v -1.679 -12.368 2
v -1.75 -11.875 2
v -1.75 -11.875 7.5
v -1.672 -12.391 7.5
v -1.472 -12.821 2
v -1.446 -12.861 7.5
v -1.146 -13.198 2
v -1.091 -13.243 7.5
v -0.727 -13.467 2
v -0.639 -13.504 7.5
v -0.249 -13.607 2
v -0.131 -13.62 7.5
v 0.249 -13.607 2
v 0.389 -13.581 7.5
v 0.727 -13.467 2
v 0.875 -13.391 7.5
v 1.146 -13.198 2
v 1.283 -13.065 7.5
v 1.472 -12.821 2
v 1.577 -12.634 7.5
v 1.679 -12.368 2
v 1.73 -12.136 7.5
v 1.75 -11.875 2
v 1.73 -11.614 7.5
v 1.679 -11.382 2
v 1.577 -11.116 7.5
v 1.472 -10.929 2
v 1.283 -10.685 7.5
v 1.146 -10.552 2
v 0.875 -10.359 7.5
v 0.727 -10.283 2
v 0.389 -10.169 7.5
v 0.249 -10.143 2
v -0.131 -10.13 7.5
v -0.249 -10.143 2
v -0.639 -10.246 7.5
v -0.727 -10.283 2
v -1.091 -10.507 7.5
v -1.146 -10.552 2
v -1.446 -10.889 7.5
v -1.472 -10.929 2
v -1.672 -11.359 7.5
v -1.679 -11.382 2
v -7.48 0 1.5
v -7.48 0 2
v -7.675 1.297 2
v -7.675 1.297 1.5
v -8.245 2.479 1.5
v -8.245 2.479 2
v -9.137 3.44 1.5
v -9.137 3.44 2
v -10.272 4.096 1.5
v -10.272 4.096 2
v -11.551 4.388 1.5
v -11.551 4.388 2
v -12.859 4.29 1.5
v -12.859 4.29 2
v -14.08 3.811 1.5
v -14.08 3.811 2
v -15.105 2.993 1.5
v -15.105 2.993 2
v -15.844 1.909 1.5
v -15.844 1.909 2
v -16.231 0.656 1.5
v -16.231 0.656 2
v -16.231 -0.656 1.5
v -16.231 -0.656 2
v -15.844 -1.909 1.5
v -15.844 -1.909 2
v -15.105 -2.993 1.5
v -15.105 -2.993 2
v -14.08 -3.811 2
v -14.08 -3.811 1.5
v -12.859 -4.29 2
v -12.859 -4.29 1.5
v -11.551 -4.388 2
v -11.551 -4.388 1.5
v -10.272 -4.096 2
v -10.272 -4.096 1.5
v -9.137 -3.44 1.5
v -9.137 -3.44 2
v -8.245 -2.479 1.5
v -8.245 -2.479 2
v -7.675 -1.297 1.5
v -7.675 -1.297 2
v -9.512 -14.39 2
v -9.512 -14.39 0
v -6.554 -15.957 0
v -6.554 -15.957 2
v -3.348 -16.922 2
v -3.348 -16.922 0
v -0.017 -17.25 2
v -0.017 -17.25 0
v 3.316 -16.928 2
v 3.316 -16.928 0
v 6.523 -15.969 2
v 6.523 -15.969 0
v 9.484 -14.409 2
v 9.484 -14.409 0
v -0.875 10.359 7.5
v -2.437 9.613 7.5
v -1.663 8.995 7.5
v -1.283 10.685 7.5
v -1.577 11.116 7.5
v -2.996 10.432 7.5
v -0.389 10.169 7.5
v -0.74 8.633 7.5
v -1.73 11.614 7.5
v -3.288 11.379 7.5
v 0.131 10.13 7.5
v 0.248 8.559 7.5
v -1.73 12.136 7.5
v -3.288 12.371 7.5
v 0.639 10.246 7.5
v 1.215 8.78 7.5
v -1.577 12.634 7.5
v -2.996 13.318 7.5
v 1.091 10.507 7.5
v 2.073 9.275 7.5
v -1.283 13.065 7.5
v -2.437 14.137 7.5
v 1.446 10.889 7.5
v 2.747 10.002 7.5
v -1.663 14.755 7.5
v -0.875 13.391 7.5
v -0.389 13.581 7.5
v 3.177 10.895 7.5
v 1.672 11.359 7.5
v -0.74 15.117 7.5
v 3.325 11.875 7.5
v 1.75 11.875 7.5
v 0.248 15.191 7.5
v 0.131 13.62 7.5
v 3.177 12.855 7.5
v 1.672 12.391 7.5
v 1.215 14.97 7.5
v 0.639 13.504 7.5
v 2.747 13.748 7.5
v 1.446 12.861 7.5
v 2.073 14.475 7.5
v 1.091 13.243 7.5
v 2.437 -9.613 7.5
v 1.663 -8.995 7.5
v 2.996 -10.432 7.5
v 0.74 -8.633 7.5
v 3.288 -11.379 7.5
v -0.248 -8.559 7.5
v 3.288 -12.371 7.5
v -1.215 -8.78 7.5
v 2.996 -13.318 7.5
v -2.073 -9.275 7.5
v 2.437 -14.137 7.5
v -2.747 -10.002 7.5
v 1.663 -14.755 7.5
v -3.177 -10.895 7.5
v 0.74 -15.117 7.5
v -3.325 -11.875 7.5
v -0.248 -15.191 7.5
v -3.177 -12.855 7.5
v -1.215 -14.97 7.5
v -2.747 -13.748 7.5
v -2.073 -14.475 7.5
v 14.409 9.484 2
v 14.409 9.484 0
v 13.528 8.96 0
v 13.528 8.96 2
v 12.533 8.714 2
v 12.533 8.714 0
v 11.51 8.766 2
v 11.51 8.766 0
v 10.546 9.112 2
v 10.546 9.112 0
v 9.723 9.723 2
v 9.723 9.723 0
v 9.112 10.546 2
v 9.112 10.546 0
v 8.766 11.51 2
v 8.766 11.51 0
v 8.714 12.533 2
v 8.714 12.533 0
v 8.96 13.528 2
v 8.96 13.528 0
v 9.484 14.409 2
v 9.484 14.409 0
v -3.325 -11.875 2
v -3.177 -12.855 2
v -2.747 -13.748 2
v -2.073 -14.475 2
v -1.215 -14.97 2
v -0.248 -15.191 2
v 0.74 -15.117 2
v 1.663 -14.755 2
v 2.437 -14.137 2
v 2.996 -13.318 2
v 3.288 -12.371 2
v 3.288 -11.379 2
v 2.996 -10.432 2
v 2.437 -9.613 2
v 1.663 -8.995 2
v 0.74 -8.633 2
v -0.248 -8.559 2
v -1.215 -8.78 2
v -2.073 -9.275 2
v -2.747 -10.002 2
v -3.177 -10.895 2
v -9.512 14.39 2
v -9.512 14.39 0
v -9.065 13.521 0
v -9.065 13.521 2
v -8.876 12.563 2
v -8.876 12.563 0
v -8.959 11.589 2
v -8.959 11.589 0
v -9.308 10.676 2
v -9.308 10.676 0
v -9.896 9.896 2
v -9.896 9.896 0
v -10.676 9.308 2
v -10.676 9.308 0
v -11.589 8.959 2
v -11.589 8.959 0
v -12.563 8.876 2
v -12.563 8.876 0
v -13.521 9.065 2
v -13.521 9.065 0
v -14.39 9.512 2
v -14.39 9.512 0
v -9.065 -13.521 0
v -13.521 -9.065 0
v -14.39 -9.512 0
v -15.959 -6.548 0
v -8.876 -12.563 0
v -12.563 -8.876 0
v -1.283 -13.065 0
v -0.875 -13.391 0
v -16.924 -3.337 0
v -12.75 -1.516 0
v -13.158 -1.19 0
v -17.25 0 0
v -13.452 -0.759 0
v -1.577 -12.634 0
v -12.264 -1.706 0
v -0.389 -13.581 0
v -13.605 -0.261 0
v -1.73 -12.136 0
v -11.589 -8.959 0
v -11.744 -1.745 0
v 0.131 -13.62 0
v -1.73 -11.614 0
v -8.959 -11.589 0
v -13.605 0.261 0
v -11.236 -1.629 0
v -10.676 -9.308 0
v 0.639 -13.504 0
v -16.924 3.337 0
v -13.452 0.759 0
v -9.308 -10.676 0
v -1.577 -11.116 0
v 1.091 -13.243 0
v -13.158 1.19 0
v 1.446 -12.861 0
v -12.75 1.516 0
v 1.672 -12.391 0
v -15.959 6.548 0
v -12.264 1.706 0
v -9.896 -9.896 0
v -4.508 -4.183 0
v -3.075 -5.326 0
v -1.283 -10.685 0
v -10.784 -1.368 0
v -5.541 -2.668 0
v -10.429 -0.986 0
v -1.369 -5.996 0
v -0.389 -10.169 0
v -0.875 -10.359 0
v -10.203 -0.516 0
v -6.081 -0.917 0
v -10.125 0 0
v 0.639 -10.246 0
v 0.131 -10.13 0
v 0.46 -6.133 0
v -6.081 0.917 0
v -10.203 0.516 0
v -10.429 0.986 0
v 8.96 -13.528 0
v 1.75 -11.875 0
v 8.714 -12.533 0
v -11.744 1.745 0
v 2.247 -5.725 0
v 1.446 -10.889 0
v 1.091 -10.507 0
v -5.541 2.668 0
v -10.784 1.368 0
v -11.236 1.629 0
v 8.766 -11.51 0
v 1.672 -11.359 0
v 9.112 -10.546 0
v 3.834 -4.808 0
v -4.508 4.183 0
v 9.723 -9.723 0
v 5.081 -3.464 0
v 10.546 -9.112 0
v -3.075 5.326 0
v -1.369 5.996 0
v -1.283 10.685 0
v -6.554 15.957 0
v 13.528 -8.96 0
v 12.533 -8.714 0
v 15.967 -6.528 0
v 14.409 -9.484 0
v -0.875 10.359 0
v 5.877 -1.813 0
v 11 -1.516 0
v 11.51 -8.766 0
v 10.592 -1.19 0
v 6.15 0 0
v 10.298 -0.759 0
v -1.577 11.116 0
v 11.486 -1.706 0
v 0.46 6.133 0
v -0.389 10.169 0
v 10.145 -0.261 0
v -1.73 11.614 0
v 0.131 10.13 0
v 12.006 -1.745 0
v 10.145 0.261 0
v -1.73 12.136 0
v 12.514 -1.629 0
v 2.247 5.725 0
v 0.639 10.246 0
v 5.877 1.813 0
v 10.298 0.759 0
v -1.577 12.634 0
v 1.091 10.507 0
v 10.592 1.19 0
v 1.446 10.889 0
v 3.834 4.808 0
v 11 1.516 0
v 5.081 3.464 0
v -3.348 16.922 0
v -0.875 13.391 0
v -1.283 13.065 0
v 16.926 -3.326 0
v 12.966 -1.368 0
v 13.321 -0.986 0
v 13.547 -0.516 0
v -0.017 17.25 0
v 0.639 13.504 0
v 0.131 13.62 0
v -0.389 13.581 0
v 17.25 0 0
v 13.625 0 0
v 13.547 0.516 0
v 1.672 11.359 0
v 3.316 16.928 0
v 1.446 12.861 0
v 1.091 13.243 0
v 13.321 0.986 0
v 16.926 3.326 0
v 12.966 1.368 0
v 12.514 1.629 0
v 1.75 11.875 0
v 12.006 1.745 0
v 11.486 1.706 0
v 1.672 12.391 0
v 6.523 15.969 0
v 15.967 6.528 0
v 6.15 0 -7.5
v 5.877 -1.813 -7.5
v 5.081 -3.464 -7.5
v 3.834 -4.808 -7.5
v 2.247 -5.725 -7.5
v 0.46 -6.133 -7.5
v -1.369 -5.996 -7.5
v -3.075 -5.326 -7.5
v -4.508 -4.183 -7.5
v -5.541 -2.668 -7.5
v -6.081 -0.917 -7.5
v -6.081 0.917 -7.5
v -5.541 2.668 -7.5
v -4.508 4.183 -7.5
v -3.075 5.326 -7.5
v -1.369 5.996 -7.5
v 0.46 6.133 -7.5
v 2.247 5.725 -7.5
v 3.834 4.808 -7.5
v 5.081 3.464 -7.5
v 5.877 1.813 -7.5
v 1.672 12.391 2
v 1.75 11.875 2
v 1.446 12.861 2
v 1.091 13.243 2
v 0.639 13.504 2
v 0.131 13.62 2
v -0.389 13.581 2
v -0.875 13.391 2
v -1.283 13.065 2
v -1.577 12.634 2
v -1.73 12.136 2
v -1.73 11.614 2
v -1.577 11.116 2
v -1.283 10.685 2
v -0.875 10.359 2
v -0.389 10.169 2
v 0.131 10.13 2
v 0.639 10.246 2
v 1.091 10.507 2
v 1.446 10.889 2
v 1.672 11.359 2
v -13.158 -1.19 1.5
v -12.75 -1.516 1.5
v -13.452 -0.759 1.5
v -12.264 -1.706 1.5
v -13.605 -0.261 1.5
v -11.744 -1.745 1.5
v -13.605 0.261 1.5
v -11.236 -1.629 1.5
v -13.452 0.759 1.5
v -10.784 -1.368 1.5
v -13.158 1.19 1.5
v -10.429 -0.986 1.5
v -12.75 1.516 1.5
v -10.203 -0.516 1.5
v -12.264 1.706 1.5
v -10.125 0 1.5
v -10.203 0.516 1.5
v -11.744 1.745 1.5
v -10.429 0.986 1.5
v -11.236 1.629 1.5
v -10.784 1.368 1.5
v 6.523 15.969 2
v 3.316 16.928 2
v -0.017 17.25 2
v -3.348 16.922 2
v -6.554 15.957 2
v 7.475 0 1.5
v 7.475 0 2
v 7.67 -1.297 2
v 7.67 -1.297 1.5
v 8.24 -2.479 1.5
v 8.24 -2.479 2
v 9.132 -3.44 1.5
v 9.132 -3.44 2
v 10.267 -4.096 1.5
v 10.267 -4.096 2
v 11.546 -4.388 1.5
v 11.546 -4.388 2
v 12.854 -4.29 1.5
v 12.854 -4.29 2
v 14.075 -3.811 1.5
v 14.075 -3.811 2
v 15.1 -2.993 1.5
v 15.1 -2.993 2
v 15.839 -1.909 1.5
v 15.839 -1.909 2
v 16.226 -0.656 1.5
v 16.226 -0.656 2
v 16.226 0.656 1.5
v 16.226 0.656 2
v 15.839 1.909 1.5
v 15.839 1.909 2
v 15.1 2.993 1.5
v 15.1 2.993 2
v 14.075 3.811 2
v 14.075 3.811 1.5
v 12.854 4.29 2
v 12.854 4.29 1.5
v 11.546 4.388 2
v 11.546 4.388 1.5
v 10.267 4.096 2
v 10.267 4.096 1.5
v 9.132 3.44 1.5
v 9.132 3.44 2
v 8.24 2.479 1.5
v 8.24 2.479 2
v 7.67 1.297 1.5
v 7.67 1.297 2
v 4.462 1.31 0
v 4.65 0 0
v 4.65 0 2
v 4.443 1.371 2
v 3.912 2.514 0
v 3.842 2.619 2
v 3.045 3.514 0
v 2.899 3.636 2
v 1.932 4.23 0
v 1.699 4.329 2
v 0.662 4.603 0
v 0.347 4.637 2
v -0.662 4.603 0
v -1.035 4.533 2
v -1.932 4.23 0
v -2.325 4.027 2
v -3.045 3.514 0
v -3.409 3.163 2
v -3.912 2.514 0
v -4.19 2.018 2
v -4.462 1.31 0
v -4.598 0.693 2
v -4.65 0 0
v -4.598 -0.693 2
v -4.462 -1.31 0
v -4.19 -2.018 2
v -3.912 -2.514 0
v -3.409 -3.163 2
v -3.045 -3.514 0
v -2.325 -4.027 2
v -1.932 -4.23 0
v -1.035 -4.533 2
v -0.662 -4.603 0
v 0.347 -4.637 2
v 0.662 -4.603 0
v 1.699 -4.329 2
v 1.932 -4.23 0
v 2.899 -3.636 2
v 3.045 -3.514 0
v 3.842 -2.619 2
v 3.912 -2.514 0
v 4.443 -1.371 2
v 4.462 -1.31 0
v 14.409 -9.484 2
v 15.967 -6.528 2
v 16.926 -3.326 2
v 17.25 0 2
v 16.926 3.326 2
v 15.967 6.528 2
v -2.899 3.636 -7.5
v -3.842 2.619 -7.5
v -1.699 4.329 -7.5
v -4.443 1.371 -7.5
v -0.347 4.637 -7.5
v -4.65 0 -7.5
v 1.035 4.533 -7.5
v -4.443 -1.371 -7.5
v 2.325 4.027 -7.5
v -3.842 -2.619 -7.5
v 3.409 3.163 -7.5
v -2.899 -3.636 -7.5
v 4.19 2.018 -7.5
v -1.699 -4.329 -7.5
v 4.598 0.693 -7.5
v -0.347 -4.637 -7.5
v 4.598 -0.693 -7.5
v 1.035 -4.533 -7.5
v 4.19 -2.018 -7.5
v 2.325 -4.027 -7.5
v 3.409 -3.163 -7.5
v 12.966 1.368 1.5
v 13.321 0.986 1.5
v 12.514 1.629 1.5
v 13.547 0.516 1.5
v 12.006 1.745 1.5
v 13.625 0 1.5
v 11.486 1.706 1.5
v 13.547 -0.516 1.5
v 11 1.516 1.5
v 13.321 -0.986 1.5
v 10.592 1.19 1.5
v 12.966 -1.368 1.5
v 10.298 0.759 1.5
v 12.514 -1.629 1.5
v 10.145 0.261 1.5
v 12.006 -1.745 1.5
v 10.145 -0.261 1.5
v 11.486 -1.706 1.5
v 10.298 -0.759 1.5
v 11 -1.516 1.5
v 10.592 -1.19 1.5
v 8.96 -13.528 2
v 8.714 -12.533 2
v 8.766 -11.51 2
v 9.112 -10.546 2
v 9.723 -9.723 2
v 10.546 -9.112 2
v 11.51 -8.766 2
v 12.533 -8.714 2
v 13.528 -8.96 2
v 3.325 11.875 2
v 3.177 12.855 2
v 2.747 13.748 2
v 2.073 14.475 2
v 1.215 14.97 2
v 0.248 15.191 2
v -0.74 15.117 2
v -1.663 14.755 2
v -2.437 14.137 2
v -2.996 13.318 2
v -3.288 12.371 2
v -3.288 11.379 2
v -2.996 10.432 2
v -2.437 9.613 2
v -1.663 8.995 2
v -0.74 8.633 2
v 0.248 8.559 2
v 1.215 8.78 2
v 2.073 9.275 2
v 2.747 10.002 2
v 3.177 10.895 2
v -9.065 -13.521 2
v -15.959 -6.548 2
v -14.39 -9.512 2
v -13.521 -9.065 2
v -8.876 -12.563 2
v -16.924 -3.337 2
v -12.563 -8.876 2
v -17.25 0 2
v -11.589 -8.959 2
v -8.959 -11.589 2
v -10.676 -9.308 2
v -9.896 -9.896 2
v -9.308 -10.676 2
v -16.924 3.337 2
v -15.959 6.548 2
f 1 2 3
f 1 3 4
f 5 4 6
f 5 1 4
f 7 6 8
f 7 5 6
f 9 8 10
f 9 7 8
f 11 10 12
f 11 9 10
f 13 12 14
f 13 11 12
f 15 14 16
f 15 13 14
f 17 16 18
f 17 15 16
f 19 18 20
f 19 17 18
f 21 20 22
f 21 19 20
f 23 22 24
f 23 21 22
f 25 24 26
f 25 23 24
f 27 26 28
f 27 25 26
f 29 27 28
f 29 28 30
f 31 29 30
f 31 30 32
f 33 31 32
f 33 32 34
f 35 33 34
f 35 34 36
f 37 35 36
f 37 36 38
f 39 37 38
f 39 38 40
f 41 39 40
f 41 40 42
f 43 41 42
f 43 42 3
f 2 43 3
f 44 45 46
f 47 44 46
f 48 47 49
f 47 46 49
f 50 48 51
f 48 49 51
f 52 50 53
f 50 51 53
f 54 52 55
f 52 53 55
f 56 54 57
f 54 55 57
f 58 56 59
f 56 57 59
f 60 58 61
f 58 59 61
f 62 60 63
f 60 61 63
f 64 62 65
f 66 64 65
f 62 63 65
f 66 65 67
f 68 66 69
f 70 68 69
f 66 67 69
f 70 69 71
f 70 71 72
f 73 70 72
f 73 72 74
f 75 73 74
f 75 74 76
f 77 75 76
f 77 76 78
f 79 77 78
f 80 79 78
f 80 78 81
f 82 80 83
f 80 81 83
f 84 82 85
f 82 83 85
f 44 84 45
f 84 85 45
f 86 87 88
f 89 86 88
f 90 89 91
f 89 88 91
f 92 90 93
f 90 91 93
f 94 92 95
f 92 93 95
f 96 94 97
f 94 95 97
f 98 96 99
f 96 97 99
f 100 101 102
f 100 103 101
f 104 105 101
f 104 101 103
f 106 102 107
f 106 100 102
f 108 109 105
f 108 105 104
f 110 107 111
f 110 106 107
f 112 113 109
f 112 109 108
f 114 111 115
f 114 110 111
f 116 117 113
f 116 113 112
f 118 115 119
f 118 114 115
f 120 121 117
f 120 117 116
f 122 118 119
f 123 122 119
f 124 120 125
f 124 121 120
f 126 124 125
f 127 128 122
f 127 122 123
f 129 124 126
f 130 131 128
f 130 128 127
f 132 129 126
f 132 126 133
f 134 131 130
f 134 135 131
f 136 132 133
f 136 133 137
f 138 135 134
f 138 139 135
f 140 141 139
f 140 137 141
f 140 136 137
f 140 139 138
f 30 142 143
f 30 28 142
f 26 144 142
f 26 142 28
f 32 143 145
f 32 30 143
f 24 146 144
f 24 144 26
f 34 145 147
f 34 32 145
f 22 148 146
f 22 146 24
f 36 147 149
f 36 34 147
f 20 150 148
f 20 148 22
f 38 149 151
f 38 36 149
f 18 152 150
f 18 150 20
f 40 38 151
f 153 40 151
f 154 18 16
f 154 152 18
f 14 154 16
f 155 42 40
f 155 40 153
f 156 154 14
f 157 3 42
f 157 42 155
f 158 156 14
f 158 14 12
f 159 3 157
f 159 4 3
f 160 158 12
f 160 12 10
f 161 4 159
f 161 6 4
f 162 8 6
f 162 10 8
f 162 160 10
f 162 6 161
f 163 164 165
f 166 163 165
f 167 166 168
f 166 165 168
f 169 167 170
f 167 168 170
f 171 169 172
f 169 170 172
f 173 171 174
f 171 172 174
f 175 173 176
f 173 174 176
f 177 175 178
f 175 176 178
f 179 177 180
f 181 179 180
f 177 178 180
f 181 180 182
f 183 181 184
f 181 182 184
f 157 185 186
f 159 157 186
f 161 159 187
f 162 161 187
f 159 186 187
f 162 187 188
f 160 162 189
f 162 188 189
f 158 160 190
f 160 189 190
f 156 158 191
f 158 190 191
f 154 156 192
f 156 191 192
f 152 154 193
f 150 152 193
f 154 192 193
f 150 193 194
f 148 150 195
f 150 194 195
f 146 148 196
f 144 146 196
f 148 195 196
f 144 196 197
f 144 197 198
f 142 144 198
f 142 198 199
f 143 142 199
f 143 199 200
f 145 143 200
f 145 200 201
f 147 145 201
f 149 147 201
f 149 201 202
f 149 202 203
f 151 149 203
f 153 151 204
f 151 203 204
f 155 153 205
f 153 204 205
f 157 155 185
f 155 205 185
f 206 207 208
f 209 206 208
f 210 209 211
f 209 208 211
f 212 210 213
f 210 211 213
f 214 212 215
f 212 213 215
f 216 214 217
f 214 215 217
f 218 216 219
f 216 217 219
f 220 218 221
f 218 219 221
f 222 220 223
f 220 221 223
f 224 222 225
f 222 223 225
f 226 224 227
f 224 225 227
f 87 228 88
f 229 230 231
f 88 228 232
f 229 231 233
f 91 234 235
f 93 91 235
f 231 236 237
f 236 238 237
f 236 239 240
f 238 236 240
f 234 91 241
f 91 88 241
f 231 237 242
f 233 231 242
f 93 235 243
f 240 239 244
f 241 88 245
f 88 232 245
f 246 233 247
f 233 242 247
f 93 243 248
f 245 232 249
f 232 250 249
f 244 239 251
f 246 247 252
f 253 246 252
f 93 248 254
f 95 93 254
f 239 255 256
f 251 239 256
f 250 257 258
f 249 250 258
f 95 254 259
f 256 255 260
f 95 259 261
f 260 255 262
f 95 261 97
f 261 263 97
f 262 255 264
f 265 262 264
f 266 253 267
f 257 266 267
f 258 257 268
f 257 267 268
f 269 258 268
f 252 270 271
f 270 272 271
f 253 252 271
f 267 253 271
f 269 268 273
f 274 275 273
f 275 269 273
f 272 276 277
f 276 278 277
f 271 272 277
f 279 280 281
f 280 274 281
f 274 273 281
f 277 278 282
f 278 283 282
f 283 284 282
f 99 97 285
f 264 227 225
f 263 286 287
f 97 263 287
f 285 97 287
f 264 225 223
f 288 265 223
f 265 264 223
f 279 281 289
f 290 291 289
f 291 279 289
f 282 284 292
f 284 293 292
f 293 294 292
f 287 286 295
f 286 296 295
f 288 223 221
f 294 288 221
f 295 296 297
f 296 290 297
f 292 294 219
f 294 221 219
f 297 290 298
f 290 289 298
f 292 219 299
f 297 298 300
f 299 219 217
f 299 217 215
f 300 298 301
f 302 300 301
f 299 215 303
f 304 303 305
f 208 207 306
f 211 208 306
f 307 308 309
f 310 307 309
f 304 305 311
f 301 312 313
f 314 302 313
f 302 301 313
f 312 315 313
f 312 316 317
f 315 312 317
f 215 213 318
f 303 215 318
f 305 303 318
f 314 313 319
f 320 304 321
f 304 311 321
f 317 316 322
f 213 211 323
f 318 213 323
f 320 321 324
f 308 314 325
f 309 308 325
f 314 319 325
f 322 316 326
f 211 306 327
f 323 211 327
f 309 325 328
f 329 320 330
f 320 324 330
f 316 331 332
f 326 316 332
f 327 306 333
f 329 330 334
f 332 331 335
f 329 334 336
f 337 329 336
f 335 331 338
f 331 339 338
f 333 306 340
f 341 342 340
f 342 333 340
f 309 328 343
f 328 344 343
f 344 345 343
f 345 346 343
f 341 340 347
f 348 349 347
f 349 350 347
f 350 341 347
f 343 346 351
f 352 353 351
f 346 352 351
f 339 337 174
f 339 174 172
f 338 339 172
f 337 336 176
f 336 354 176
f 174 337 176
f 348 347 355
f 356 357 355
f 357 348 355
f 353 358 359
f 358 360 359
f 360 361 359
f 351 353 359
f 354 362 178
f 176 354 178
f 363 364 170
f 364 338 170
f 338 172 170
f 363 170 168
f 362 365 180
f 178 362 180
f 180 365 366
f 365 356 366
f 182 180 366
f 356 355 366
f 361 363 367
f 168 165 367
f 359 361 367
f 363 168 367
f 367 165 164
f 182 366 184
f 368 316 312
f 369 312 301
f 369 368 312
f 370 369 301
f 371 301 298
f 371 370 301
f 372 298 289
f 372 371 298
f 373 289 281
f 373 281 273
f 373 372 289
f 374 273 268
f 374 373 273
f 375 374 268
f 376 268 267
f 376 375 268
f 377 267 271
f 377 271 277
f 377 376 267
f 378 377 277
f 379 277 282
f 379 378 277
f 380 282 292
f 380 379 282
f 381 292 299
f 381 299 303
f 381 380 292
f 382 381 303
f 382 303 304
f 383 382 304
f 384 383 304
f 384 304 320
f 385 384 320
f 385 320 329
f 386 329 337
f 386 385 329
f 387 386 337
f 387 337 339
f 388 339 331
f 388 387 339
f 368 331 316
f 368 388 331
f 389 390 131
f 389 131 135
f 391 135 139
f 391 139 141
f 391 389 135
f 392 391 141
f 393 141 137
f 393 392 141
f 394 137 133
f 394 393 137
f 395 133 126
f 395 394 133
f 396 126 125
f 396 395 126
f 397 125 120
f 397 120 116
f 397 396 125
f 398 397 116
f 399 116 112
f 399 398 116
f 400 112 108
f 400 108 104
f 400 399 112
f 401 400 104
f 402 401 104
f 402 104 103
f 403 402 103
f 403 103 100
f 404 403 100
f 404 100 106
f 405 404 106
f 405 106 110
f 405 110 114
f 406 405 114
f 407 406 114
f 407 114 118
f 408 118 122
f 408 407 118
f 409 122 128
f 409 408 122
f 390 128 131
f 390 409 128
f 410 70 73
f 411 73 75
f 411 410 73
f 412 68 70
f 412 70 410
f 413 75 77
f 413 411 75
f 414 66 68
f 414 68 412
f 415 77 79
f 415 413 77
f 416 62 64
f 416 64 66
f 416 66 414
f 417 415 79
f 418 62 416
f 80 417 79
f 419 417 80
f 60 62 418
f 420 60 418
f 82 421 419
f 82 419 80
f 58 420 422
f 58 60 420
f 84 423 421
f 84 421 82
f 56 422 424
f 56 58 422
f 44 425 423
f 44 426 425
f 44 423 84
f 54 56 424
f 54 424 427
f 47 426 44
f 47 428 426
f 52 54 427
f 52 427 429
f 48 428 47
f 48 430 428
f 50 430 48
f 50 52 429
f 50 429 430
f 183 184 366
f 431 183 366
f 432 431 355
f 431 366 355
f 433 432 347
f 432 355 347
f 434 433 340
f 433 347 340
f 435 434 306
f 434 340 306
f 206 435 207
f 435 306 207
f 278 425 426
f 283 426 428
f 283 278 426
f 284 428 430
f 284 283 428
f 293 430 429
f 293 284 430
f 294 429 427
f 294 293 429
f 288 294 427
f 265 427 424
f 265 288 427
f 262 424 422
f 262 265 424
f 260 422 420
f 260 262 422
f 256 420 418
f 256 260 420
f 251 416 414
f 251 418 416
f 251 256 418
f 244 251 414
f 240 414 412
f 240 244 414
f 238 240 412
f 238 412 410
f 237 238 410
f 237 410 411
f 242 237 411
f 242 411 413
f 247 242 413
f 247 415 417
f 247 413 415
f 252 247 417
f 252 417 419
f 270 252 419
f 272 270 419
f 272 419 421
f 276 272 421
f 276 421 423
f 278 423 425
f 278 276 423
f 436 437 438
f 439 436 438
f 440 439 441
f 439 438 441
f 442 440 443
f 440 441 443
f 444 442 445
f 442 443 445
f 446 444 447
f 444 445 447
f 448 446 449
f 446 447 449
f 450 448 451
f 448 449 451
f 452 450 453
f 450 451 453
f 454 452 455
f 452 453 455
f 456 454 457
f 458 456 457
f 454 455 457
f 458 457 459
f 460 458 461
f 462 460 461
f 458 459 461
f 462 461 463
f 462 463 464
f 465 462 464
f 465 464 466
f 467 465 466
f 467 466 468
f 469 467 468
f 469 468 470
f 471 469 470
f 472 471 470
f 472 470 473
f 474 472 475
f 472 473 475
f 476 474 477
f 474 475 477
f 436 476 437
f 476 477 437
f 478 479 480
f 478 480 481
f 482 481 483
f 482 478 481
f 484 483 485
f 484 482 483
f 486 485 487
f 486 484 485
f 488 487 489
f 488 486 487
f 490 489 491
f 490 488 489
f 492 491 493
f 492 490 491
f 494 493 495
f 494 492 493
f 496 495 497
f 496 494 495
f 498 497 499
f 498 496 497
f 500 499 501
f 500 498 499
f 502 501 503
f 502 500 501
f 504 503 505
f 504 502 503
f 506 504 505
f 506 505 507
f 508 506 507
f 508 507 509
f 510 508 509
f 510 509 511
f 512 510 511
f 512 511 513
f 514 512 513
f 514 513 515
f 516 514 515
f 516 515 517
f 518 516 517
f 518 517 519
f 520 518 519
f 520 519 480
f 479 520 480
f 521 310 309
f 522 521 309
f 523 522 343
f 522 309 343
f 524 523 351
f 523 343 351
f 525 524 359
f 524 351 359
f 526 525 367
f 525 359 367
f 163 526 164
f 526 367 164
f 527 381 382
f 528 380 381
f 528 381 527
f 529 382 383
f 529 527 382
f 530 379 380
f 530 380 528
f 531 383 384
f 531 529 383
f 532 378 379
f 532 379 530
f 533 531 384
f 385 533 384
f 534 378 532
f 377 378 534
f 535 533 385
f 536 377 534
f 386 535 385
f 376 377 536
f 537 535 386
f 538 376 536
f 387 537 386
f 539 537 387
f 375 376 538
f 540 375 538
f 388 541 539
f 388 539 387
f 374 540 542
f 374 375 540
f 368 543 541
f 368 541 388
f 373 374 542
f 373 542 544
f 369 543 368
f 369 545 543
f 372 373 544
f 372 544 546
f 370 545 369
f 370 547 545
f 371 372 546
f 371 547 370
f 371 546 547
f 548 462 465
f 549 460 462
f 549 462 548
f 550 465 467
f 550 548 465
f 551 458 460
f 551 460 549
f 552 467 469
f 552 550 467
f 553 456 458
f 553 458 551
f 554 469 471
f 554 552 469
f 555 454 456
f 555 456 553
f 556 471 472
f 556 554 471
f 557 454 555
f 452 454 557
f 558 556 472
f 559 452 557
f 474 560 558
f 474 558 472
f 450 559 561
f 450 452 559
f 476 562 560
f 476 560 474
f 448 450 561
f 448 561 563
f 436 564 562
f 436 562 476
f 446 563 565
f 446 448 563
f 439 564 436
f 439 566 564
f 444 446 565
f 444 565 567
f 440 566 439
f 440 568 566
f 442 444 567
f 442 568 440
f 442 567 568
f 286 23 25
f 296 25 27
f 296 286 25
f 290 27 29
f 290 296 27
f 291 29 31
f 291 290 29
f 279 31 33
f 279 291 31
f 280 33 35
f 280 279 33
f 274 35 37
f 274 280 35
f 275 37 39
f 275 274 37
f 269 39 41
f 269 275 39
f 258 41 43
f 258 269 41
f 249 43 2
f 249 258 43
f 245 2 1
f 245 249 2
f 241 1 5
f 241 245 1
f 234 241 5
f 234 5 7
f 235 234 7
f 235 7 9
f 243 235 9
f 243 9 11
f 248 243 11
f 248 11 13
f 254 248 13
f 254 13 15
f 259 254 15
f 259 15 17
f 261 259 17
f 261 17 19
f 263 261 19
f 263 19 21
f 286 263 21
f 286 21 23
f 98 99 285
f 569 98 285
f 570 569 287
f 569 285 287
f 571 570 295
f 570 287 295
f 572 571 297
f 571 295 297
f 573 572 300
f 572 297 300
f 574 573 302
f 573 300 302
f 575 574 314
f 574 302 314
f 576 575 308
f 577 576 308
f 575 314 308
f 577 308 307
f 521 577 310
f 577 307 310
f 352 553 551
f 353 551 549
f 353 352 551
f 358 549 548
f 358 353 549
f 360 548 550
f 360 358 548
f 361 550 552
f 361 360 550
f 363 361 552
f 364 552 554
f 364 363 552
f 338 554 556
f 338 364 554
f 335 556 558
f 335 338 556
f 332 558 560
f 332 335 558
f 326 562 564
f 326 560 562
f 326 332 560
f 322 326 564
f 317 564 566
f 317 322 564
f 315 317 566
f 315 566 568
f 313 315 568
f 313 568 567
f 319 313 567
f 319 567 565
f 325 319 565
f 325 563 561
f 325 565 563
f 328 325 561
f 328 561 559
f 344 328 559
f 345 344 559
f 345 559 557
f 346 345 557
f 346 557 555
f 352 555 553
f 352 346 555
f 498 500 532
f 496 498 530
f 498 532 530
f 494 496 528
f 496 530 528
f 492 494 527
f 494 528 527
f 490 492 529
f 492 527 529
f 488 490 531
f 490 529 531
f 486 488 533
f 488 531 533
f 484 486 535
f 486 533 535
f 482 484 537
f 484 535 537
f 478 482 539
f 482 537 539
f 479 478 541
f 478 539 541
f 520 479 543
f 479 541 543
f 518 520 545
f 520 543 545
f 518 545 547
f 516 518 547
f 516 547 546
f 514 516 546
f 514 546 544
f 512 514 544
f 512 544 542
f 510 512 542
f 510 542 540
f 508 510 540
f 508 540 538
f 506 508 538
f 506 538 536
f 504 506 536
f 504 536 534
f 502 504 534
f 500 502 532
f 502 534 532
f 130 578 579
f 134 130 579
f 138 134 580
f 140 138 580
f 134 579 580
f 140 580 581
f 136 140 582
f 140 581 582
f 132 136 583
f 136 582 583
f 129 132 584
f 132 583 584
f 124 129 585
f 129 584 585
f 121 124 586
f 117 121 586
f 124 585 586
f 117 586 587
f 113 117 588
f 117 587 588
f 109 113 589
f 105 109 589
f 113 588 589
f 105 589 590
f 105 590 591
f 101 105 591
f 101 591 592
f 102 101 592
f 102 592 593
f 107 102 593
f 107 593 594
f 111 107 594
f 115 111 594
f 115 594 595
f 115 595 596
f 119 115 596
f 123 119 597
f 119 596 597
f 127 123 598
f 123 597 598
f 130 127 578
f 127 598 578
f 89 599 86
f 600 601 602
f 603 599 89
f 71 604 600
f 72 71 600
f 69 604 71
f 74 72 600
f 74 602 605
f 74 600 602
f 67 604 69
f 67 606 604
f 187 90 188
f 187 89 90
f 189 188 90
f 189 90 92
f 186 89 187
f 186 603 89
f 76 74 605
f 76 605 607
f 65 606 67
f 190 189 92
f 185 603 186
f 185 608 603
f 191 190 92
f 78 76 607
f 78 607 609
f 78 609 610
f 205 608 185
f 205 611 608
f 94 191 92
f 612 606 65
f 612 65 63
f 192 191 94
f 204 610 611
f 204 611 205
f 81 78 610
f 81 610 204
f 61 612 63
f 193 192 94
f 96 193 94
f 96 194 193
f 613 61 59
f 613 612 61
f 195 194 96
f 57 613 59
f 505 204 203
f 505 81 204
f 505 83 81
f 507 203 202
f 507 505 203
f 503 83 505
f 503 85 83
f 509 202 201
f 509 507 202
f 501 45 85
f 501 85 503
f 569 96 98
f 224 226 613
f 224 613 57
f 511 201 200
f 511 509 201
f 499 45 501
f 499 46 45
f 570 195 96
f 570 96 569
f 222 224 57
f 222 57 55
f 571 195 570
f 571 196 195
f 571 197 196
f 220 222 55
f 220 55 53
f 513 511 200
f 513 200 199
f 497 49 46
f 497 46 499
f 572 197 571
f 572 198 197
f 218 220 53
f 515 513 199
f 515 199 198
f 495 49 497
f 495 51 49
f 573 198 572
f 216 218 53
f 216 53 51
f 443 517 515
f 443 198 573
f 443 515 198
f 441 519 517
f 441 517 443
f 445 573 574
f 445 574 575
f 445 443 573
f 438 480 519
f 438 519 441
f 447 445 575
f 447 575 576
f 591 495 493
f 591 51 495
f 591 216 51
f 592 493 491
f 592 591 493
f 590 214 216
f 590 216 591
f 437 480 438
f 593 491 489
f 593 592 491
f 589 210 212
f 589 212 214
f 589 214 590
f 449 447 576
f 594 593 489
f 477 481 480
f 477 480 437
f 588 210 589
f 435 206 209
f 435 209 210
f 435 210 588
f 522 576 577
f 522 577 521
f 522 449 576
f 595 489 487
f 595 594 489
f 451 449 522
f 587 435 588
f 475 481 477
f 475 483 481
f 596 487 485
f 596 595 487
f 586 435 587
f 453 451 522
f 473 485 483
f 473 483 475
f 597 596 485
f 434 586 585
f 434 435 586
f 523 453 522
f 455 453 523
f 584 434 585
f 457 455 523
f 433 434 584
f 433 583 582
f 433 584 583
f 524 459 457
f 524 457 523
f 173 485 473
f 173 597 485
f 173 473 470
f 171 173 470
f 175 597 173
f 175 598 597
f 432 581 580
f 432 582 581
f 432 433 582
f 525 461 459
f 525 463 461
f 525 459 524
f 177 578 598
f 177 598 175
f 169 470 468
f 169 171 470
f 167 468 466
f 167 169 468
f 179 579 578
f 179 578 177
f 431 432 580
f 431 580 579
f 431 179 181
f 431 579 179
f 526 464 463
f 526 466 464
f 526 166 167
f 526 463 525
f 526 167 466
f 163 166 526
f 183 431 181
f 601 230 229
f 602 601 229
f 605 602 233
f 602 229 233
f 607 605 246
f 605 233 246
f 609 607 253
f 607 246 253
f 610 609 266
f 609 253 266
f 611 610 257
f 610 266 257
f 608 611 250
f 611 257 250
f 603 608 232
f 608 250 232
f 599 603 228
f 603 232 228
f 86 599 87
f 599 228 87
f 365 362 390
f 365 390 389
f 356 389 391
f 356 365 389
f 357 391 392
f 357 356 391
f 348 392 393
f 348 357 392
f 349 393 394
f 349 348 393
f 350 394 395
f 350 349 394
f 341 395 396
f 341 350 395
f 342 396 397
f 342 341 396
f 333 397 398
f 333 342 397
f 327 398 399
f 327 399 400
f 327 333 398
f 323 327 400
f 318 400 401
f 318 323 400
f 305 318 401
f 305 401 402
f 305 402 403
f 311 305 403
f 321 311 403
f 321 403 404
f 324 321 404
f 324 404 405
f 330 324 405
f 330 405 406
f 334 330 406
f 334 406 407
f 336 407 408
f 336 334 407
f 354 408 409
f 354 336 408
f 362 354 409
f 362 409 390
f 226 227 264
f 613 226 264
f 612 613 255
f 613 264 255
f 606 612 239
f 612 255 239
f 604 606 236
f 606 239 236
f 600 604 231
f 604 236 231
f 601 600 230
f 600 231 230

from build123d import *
from build123d.topology import SkipClean

# Parameters (mm, degrees)
ESQUISSE1_R             = 1.75
ESQUISSE1_R_2           = 4.65
BOSS_EXTRU_1_DEPTH      = 2
BOSS_EXTRU_2_START      = 7.5
ESQUISSE2_R             = 6.15
ESQUISSE2_R_2           = 4.65
BOSS_EXTRU_2_DEPTH      = 7.5
ESQUISSE3_R             = 3.325
ESQUISSE3_R_2           = 1.75
BOSS_EXTRU_3_DEPTH      = 5.5
ESQUISSE4_R             = 4.4
ENL_V_MAT_EXTRU_1_DEPTH = 0.5


with BuildPart() as part:
    # Esquisse1 → Boss.-Extru.1 (new body)
    with BuildSketch(Plane.XY):
        with BuildLine():
            ThreePointArc((-9.512110845, 14.390352576), (-9.895511173, 9.895511173), (-14.390352576, 9.512110845))
            ThreePointArc((-14.390352576, 9.512110845), (-17.25, 0), (-14.390352576, -9.512110845))
            ThreePointArc((-14.390352576, -9.512110845), (-9.895511173, -9.895511173), (-9.512110845, -14.390352576))
            ThreePointArc((-9.512110845, -14.390352576), (-0.01659063, -17.249992022), (9.484412678, -14.408622979))
            ThreePointArc((9.484412678, -14.408622979), (9.722718241, -9.722718241), (14.408622979, -9.484412678))
            ThreePointArc((14.408622979, -9.484412678), (17.25, 0), (14.408622979, 9.484412678))
            ThreePointArc((14.408622979, 9.484412678), (9.722718241, 9.722718241), (9.484412678, 14.408622979))
            ThreePointArc((9.484412678, 14.408622979), (-0.01659063, 17.249992022), (-9.512110845, 14.390352576))
        make_face()
        with Locations((0, -11.875)):
            Circle(ESQUISSE1_R, mode=Mode.SUBTRACT)
        with Locations((-11.875, 0)):
            Circle(ESQUISSE1_R, mode=Mode.SUBTRACT)
        Circle(ESQUISSE1_R_2, mode=Mode.SUBTRACT)
        with Locations((11.875, 0)):
            Circle(ESQUISSE1_R, mode=Mode.SUBTRACT)
        with Locations((0, 11.875)):
            Circle(ESQUISSE1_R, mode=Mode.SUBTRACT)
    extrude(amount=BOSS_EXTRU_1_DEPTH)

    # Esquisse2 → Boss.-Extru.2 (add)
    with SkipClean():  # the faces are left unmerged after this step: merging them gives an invalid solid
        with BuildSketch(Plane(origin=(0, 0, 0), x_dir=(-1, 0, 0), z_dir=(0, 0, -1)).offset(BOSS_EXTRU_2_START)):
            with Locations(Location((0, 0, 0), (0, 0, 180))):
                Circle(ESQUISSE2_R)
            Circle(ESQUISSE2_R_2, mode=Mode.SUBTRACT)
        extrude(amount=-BOSS_EXTRU_2_DEPTH)

    # Esquisse3 → Boss.-Extru.3 (add)
    # profile 1 of 2: a face of its own
    with SkipClean():  # the faces are left unmerged after this step: merging them gives an invalid solid
        with BuildSketch(Plane.XY.offset(2)):
            with Locations((0, 11.875)):
                Circle(ESQUISSE3_R)
            with Locations((0, 11.875)):
                Circle(ESQUISSE3_R_2, mode=Mode.SUBTRACT)
        # profile 2 of 2: a face of its own
        with BuildSketch(Plane.XY.offset(2)):
            with Locations(Location((0, -11.875, 0), (0, 0, 180))):
                Circle(ESQUISSE3_R)
            with Locations(Location((0, -11.875, 0), (0, 0, 180))):
                Circle(ESQUISSE3_R_2, mode=Mode.SUBTRACT)
        extrude(amount=BOSS_EXTRU_3_DEPTH)

    # Esquisse4 → Enlèv. mat.-Extru.1 (cut)
    with SkipClean():  # the faces are left unmerged after this step: merging them gives an invalid solid
        with BuildSketch(Plane.XY.offset(2)):
            with Locations((-11.88, 0)):
                Circle(ESQUISSE4_R)
            with Locations(Location((11.875, 0, 0), (0, 0, 180))):
                Circle(ESQUISSE4_R)
        extrude(amount=-ENL_V_MAT_EXTRU_1_DEPTH, mode=Mode.SUBTRACT)


solid = part.part
